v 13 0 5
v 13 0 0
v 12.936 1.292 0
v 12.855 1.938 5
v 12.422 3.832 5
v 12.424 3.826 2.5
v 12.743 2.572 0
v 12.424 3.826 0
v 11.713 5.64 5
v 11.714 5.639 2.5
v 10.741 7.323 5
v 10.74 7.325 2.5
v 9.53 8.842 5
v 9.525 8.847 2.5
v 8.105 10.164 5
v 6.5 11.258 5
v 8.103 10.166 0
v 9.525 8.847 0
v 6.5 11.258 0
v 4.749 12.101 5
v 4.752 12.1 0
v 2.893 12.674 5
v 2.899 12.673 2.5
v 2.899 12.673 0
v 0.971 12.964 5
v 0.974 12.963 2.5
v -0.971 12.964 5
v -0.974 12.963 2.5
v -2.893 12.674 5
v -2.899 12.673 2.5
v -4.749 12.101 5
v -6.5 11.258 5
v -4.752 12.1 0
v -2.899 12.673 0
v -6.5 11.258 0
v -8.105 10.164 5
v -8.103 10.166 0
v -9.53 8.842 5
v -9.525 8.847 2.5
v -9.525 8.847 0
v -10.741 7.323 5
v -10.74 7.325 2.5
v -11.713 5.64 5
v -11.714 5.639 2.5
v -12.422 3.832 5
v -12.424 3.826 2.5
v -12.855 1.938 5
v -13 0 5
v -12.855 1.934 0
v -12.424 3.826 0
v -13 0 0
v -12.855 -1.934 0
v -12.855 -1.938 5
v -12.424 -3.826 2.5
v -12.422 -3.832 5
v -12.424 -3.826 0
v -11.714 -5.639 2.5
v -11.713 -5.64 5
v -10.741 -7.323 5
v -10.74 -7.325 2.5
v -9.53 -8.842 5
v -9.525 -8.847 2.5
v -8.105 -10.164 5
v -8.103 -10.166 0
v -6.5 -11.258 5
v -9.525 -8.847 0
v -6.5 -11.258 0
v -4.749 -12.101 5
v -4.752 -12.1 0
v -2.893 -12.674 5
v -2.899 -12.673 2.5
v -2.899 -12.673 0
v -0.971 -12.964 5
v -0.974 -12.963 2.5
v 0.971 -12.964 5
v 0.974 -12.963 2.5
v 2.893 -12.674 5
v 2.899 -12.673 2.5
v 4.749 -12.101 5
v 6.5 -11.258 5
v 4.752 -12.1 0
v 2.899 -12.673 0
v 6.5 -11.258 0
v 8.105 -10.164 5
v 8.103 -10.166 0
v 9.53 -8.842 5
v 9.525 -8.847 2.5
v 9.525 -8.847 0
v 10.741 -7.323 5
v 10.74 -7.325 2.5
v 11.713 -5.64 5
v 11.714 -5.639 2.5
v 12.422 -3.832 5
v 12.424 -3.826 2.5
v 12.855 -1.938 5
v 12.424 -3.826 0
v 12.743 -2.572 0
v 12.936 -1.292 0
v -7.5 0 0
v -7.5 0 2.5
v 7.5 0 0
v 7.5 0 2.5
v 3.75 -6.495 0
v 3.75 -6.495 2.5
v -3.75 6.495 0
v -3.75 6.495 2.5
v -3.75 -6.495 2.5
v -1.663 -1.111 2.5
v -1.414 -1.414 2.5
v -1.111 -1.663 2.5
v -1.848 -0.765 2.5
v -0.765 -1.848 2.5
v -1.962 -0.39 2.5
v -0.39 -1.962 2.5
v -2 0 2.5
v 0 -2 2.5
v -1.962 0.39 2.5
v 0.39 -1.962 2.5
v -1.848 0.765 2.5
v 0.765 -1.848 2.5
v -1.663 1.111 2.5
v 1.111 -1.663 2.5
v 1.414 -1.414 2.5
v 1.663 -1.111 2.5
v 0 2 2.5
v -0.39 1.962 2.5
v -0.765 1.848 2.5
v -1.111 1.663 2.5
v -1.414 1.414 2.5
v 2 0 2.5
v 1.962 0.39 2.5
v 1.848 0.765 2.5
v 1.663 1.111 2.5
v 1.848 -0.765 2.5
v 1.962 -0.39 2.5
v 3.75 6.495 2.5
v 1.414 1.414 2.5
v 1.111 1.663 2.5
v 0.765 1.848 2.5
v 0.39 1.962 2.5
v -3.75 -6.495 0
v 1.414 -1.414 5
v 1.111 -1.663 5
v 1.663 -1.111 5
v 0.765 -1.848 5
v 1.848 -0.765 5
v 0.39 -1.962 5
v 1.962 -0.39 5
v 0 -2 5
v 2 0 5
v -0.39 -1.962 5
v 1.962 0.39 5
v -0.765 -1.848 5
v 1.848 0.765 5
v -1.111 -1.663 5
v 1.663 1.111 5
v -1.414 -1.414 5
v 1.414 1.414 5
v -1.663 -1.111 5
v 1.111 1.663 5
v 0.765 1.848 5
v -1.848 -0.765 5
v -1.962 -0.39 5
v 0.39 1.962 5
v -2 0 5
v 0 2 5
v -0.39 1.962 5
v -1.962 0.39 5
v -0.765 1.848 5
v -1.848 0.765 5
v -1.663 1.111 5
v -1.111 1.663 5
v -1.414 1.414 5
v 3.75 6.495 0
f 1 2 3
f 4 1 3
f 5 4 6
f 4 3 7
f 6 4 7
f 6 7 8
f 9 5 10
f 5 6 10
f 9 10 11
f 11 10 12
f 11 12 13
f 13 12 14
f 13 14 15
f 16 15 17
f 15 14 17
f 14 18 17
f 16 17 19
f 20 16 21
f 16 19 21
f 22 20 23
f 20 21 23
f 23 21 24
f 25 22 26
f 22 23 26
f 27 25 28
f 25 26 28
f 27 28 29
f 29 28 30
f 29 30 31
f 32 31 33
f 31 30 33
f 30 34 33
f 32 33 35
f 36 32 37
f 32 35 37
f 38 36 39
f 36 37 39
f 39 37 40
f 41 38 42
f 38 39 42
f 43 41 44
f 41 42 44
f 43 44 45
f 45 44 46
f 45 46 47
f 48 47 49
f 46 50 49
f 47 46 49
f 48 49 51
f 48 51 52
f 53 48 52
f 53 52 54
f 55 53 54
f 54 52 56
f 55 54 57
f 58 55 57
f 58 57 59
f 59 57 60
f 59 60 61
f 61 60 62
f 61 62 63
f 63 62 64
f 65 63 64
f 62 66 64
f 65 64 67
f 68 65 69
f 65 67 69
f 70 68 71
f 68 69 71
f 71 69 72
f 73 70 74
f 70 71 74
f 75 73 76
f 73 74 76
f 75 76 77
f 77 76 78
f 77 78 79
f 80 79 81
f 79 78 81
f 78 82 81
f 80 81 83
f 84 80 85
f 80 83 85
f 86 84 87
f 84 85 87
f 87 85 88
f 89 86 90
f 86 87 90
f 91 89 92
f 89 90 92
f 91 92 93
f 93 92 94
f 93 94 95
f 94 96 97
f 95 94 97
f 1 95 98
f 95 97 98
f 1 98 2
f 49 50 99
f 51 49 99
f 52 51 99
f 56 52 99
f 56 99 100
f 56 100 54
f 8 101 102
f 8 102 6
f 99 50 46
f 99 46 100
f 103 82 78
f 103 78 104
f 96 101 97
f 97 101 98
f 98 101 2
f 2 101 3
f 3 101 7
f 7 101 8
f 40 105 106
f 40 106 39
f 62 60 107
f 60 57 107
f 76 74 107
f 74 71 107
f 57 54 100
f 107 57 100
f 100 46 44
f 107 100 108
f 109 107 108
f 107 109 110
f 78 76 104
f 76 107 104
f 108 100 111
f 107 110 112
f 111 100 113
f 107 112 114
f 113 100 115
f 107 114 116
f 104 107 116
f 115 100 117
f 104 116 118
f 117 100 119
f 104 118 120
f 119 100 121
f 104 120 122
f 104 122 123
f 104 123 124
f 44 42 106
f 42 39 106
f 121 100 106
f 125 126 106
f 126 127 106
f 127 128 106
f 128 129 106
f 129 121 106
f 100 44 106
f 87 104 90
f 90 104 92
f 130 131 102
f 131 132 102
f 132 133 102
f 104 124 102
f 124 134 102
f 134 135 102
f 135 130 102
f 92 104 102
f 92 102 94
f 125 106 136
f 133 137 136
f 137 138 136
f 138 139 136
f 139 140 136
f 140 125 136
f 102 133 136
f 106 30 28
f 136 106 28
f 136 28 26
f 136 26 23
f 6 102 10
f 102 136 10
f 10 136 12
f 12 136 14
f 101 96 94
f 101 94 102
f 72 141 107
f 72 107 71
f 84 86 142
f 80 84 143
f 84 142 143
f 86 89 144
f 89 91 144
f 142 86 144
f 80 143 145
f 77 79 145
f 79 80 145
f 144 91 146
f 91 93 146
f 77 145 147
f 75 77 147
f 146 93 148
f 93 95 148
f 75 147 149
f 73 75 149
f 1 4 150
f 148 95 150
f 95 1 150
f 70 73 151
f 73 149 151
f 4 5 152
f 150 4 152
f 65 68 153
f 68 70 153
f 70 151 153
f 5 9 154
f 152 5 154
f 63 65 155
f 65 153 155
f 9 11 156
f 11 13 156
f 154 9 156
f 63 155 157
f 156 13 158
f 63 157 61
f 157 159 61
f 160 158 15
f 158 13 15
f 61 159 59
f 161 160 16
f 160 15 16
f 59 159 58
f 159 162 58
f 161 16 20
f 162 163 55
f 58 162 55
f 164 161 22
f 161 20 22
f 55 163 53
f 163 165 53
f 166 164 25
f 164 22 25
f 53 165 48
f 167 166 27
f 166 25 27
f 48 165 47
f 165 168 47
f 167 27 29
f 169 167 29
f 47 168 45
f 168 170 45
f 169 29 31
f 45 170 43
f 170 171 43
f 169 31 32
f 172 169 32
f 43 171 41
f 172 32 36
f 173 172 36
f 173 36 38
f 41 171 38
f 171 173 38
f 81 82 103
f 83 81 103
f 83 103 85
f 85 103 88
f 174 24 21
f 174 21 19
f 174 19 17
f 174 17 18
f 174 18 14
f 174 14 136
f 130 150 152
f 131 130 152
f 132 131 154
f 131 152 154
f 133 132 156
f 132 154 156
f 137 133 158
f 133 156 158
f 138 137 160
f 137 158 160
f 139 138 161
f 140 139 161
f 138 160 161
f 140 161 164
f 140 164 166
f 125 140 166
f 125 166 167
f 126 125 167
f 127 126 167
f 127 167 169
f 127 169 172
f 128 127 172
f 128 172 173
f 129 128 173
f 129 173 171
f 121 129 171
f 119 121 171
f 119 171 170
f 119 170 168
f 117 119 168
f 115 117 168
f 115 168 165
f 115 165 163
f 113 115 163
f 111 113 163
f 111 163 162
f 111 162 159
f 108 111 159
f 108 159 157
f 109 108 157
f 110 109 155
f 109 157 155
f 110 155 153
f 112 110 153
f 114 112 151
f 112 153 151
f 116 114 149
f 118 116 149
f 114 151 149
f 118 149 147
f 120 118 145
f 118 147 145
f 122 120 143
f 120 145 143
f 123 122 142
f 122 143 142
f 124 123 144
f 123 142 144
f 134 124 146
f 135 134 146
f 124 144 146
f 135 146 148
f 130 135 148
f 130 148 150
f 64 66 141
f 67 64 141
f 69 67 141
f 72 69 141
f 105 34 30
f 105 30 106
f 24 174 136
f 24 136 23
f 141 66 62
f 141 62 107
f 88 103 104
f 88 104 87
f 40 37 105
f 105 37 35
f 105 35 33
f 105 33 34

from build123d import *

# Parameters (mm, degrees)
SKETCH_3_R          = 13
EXTRUDE_1_DEPTH     = 5
CUT_EXTRUDE_2_DEPTH = 2.5
SKETCH_6_R          = 2
CUT_EXTRUDE_3_DEPTH = 18
SKETCH_7_R          = 7.5
CUT_EXTRUDE_4_DEPTH = 8
CUT_EXTRUDE_6_DEPTH = 5
FILLET_1_R          = 1
SKETCH_10_W         = 2
SKETCH_10_H         = 13.5
CUT_EXTRUDE_7_DEPTH = 0.5
SKETCH_11_R         = 25
CUT_EXTRUDE_8_DEPTH = 13


with BuildPart() as part:
    # ｽｹｯﾁ3 → ﾎﾞｽ - 押し出し1 (new body)
    with BuildSketch(Plane.XY):
        Circle(SKETCH_3_R)
    extrude(amount=EXTRUDE_1_DEPTH)

    # ｽｹｯﾁ2 → ｶｯﾄ - 押し出し2 (cut)
    with BuildSketch(Plane.XY):
        with BuildLine():
            Line((3.75, 6.495190528), (2.773808556, 13.582081265))
            ThreePointArc((2.773808556, 13.582081265), (0, 16), (-2.773808556, 13.582081265))
            Line((-2.773808556, 13.582081265), (-3.75, 6.495190528))
            Line((-3.75, 6.495190528), (-10.375523134, 9.193229308))
            ThreePointArc((-10.375523134, 9.193229308), (-13.856406461, 8), (-13.14933169, 4.388851958))
            Line((-13.14933169, 4.388851958), (-7.5, 0))
            Line((-7.5, 0), (-13.14933169, -4.388851958))
            ThreePointArc((-13.14933169, -4.388851958), (-13.856406461, -8), (-10.375523134, -9.193229308))
            Line((-10.375523134, -9.193229308), (-3.75, -6.495190528))
            Line((-3.75, -6.495190528), (-2.773808556, -13.582081265))
            ThreePointArc((-2.773808556, -13.582081265), (0, -16), (2.773808556, -13.582081265))
            Line((2.773808556, -13.582081265), (3.75, -6.495190528))
            Line((3.75, -6.495190528), (10.375523134, -9.193229308))
            ThreePointArc((10.375523134, -9.193229308), (13.856406461, -8), (13.14933169, -4.388851958))
            Line((13.14933169, -4.388851958), (7.5, 0))
            Line((7.5, 0), (13.14933169, 4.388851958))
            ThreePointArc((13.14933169, 4.388851958), (13.856406461, 8), (10.375523134, 9.193229308))
            Line((10.375523134, 9.193229308), (3.75, 6.495190528))
        make_face()
    extrude(amount=CUT_EXTRUDE_2_DEPTH, mode=Mode.SUBTRACT)

    # ｽｹｯﾁ5 → 回転1 (revolve)
    with BuildSketch(Plane(origin=(0, 0, 0), x_dir=(1, 0, 0), z_dir=(0, 1, 0))):
        Polygon((0, -5), (25, -5), (25, -7), (10, -7), (10, -15), (25, -15), (25, -17), (0, -17), align=None)
    revolve(axis=Axis((0, 0, 0), (0, 0, 1)))

    # ｽｹｯﾁ6 → ｶｯﾄ - 押し出し3 (cut, through all)
    with BuildSketch(Plane.XY.offset(17)):
        Circle(SKETCH_6_R)
    extrude(amount=-CUT_EXTRUDE_3_DEPTH, mode=Mode.SUBTRACT)

    # ｽｹｯﾁ7 → ｶｯﾄ - 押し出し4 (cut)
    with BuildSketch(Plane.XY.offset(17)):
        Circle(SKETCH_7_R)
    extrude(amount=-CUT_EXTRUDE_4_DEPTH, mode=Mode.SUBTRACT)

    # ｽｹｯﾁ9 → ｶｯﾄ - 押し出し6 (cut)
    with BuildSketch(Plane(origin=(0, 0, 15), x_dir=(-1, 0, 0), z_dir=(0, 0, -1))):
        Polygon((-3.843473937, -0.691164305), (-11.556925253, -9.883697623), (-7.726703038, -13.097635671), (-0.013251721, -3.905102354), align=None)
    cut_extrude_6 = extrude(amount=CUT_EXTRUDE_6_DEPTH, mode=Mode.SUBTRACT)

    # ﾐﾗｰ1: ｶｯﾄ - 押し出し6 across plane
    add(cut_extrude_6.mirror(Plane(origin=(0, 0, 0), x_dir=(0, 0, 1), z_dir=(1, 0, 0))), mode=Mode.SUBTRACT)

    # ﾌｨﾚｯﾄ1
    fillet_1_edges = [part.edges().sort_by_distance(p)[0] for p in [
        (4.308653161, -9.024162451, 12.5),
        (-4.308653161, -9.024162451, 12.5),
    ]]
    fillet(fillet_1_edges, radius=FILLET_1_R)

    # ｽｹｯﾁ10 → ｶｯﾄ - 押し出し7 (cut)
    with BuildSketch(Plane.XY.offset(17)):
        with Locations((0, 16.25)):
            Rectangle(SKETCH_10_W, SKETCH_10_H)
    extrude(amount=-CUT_EXTRUDE_7_DEPTH, mode=Mode.SUBTRACT)

    # ｽｹｯﾁ11 → ｶｯﾄ - 押し出し8 (cut, through all)
    with BuildSketch(Plane(origin=(0, 0, 5), x_dir=(-1, 0, 0), z_dir=(0, 0, -1))):
        Circle(SKETCH_11_R)
    extrude(amount=-CUT_EXTRUDE_8_DEPTH, mode=Mode.SUBTRACT)


solid = part.part
